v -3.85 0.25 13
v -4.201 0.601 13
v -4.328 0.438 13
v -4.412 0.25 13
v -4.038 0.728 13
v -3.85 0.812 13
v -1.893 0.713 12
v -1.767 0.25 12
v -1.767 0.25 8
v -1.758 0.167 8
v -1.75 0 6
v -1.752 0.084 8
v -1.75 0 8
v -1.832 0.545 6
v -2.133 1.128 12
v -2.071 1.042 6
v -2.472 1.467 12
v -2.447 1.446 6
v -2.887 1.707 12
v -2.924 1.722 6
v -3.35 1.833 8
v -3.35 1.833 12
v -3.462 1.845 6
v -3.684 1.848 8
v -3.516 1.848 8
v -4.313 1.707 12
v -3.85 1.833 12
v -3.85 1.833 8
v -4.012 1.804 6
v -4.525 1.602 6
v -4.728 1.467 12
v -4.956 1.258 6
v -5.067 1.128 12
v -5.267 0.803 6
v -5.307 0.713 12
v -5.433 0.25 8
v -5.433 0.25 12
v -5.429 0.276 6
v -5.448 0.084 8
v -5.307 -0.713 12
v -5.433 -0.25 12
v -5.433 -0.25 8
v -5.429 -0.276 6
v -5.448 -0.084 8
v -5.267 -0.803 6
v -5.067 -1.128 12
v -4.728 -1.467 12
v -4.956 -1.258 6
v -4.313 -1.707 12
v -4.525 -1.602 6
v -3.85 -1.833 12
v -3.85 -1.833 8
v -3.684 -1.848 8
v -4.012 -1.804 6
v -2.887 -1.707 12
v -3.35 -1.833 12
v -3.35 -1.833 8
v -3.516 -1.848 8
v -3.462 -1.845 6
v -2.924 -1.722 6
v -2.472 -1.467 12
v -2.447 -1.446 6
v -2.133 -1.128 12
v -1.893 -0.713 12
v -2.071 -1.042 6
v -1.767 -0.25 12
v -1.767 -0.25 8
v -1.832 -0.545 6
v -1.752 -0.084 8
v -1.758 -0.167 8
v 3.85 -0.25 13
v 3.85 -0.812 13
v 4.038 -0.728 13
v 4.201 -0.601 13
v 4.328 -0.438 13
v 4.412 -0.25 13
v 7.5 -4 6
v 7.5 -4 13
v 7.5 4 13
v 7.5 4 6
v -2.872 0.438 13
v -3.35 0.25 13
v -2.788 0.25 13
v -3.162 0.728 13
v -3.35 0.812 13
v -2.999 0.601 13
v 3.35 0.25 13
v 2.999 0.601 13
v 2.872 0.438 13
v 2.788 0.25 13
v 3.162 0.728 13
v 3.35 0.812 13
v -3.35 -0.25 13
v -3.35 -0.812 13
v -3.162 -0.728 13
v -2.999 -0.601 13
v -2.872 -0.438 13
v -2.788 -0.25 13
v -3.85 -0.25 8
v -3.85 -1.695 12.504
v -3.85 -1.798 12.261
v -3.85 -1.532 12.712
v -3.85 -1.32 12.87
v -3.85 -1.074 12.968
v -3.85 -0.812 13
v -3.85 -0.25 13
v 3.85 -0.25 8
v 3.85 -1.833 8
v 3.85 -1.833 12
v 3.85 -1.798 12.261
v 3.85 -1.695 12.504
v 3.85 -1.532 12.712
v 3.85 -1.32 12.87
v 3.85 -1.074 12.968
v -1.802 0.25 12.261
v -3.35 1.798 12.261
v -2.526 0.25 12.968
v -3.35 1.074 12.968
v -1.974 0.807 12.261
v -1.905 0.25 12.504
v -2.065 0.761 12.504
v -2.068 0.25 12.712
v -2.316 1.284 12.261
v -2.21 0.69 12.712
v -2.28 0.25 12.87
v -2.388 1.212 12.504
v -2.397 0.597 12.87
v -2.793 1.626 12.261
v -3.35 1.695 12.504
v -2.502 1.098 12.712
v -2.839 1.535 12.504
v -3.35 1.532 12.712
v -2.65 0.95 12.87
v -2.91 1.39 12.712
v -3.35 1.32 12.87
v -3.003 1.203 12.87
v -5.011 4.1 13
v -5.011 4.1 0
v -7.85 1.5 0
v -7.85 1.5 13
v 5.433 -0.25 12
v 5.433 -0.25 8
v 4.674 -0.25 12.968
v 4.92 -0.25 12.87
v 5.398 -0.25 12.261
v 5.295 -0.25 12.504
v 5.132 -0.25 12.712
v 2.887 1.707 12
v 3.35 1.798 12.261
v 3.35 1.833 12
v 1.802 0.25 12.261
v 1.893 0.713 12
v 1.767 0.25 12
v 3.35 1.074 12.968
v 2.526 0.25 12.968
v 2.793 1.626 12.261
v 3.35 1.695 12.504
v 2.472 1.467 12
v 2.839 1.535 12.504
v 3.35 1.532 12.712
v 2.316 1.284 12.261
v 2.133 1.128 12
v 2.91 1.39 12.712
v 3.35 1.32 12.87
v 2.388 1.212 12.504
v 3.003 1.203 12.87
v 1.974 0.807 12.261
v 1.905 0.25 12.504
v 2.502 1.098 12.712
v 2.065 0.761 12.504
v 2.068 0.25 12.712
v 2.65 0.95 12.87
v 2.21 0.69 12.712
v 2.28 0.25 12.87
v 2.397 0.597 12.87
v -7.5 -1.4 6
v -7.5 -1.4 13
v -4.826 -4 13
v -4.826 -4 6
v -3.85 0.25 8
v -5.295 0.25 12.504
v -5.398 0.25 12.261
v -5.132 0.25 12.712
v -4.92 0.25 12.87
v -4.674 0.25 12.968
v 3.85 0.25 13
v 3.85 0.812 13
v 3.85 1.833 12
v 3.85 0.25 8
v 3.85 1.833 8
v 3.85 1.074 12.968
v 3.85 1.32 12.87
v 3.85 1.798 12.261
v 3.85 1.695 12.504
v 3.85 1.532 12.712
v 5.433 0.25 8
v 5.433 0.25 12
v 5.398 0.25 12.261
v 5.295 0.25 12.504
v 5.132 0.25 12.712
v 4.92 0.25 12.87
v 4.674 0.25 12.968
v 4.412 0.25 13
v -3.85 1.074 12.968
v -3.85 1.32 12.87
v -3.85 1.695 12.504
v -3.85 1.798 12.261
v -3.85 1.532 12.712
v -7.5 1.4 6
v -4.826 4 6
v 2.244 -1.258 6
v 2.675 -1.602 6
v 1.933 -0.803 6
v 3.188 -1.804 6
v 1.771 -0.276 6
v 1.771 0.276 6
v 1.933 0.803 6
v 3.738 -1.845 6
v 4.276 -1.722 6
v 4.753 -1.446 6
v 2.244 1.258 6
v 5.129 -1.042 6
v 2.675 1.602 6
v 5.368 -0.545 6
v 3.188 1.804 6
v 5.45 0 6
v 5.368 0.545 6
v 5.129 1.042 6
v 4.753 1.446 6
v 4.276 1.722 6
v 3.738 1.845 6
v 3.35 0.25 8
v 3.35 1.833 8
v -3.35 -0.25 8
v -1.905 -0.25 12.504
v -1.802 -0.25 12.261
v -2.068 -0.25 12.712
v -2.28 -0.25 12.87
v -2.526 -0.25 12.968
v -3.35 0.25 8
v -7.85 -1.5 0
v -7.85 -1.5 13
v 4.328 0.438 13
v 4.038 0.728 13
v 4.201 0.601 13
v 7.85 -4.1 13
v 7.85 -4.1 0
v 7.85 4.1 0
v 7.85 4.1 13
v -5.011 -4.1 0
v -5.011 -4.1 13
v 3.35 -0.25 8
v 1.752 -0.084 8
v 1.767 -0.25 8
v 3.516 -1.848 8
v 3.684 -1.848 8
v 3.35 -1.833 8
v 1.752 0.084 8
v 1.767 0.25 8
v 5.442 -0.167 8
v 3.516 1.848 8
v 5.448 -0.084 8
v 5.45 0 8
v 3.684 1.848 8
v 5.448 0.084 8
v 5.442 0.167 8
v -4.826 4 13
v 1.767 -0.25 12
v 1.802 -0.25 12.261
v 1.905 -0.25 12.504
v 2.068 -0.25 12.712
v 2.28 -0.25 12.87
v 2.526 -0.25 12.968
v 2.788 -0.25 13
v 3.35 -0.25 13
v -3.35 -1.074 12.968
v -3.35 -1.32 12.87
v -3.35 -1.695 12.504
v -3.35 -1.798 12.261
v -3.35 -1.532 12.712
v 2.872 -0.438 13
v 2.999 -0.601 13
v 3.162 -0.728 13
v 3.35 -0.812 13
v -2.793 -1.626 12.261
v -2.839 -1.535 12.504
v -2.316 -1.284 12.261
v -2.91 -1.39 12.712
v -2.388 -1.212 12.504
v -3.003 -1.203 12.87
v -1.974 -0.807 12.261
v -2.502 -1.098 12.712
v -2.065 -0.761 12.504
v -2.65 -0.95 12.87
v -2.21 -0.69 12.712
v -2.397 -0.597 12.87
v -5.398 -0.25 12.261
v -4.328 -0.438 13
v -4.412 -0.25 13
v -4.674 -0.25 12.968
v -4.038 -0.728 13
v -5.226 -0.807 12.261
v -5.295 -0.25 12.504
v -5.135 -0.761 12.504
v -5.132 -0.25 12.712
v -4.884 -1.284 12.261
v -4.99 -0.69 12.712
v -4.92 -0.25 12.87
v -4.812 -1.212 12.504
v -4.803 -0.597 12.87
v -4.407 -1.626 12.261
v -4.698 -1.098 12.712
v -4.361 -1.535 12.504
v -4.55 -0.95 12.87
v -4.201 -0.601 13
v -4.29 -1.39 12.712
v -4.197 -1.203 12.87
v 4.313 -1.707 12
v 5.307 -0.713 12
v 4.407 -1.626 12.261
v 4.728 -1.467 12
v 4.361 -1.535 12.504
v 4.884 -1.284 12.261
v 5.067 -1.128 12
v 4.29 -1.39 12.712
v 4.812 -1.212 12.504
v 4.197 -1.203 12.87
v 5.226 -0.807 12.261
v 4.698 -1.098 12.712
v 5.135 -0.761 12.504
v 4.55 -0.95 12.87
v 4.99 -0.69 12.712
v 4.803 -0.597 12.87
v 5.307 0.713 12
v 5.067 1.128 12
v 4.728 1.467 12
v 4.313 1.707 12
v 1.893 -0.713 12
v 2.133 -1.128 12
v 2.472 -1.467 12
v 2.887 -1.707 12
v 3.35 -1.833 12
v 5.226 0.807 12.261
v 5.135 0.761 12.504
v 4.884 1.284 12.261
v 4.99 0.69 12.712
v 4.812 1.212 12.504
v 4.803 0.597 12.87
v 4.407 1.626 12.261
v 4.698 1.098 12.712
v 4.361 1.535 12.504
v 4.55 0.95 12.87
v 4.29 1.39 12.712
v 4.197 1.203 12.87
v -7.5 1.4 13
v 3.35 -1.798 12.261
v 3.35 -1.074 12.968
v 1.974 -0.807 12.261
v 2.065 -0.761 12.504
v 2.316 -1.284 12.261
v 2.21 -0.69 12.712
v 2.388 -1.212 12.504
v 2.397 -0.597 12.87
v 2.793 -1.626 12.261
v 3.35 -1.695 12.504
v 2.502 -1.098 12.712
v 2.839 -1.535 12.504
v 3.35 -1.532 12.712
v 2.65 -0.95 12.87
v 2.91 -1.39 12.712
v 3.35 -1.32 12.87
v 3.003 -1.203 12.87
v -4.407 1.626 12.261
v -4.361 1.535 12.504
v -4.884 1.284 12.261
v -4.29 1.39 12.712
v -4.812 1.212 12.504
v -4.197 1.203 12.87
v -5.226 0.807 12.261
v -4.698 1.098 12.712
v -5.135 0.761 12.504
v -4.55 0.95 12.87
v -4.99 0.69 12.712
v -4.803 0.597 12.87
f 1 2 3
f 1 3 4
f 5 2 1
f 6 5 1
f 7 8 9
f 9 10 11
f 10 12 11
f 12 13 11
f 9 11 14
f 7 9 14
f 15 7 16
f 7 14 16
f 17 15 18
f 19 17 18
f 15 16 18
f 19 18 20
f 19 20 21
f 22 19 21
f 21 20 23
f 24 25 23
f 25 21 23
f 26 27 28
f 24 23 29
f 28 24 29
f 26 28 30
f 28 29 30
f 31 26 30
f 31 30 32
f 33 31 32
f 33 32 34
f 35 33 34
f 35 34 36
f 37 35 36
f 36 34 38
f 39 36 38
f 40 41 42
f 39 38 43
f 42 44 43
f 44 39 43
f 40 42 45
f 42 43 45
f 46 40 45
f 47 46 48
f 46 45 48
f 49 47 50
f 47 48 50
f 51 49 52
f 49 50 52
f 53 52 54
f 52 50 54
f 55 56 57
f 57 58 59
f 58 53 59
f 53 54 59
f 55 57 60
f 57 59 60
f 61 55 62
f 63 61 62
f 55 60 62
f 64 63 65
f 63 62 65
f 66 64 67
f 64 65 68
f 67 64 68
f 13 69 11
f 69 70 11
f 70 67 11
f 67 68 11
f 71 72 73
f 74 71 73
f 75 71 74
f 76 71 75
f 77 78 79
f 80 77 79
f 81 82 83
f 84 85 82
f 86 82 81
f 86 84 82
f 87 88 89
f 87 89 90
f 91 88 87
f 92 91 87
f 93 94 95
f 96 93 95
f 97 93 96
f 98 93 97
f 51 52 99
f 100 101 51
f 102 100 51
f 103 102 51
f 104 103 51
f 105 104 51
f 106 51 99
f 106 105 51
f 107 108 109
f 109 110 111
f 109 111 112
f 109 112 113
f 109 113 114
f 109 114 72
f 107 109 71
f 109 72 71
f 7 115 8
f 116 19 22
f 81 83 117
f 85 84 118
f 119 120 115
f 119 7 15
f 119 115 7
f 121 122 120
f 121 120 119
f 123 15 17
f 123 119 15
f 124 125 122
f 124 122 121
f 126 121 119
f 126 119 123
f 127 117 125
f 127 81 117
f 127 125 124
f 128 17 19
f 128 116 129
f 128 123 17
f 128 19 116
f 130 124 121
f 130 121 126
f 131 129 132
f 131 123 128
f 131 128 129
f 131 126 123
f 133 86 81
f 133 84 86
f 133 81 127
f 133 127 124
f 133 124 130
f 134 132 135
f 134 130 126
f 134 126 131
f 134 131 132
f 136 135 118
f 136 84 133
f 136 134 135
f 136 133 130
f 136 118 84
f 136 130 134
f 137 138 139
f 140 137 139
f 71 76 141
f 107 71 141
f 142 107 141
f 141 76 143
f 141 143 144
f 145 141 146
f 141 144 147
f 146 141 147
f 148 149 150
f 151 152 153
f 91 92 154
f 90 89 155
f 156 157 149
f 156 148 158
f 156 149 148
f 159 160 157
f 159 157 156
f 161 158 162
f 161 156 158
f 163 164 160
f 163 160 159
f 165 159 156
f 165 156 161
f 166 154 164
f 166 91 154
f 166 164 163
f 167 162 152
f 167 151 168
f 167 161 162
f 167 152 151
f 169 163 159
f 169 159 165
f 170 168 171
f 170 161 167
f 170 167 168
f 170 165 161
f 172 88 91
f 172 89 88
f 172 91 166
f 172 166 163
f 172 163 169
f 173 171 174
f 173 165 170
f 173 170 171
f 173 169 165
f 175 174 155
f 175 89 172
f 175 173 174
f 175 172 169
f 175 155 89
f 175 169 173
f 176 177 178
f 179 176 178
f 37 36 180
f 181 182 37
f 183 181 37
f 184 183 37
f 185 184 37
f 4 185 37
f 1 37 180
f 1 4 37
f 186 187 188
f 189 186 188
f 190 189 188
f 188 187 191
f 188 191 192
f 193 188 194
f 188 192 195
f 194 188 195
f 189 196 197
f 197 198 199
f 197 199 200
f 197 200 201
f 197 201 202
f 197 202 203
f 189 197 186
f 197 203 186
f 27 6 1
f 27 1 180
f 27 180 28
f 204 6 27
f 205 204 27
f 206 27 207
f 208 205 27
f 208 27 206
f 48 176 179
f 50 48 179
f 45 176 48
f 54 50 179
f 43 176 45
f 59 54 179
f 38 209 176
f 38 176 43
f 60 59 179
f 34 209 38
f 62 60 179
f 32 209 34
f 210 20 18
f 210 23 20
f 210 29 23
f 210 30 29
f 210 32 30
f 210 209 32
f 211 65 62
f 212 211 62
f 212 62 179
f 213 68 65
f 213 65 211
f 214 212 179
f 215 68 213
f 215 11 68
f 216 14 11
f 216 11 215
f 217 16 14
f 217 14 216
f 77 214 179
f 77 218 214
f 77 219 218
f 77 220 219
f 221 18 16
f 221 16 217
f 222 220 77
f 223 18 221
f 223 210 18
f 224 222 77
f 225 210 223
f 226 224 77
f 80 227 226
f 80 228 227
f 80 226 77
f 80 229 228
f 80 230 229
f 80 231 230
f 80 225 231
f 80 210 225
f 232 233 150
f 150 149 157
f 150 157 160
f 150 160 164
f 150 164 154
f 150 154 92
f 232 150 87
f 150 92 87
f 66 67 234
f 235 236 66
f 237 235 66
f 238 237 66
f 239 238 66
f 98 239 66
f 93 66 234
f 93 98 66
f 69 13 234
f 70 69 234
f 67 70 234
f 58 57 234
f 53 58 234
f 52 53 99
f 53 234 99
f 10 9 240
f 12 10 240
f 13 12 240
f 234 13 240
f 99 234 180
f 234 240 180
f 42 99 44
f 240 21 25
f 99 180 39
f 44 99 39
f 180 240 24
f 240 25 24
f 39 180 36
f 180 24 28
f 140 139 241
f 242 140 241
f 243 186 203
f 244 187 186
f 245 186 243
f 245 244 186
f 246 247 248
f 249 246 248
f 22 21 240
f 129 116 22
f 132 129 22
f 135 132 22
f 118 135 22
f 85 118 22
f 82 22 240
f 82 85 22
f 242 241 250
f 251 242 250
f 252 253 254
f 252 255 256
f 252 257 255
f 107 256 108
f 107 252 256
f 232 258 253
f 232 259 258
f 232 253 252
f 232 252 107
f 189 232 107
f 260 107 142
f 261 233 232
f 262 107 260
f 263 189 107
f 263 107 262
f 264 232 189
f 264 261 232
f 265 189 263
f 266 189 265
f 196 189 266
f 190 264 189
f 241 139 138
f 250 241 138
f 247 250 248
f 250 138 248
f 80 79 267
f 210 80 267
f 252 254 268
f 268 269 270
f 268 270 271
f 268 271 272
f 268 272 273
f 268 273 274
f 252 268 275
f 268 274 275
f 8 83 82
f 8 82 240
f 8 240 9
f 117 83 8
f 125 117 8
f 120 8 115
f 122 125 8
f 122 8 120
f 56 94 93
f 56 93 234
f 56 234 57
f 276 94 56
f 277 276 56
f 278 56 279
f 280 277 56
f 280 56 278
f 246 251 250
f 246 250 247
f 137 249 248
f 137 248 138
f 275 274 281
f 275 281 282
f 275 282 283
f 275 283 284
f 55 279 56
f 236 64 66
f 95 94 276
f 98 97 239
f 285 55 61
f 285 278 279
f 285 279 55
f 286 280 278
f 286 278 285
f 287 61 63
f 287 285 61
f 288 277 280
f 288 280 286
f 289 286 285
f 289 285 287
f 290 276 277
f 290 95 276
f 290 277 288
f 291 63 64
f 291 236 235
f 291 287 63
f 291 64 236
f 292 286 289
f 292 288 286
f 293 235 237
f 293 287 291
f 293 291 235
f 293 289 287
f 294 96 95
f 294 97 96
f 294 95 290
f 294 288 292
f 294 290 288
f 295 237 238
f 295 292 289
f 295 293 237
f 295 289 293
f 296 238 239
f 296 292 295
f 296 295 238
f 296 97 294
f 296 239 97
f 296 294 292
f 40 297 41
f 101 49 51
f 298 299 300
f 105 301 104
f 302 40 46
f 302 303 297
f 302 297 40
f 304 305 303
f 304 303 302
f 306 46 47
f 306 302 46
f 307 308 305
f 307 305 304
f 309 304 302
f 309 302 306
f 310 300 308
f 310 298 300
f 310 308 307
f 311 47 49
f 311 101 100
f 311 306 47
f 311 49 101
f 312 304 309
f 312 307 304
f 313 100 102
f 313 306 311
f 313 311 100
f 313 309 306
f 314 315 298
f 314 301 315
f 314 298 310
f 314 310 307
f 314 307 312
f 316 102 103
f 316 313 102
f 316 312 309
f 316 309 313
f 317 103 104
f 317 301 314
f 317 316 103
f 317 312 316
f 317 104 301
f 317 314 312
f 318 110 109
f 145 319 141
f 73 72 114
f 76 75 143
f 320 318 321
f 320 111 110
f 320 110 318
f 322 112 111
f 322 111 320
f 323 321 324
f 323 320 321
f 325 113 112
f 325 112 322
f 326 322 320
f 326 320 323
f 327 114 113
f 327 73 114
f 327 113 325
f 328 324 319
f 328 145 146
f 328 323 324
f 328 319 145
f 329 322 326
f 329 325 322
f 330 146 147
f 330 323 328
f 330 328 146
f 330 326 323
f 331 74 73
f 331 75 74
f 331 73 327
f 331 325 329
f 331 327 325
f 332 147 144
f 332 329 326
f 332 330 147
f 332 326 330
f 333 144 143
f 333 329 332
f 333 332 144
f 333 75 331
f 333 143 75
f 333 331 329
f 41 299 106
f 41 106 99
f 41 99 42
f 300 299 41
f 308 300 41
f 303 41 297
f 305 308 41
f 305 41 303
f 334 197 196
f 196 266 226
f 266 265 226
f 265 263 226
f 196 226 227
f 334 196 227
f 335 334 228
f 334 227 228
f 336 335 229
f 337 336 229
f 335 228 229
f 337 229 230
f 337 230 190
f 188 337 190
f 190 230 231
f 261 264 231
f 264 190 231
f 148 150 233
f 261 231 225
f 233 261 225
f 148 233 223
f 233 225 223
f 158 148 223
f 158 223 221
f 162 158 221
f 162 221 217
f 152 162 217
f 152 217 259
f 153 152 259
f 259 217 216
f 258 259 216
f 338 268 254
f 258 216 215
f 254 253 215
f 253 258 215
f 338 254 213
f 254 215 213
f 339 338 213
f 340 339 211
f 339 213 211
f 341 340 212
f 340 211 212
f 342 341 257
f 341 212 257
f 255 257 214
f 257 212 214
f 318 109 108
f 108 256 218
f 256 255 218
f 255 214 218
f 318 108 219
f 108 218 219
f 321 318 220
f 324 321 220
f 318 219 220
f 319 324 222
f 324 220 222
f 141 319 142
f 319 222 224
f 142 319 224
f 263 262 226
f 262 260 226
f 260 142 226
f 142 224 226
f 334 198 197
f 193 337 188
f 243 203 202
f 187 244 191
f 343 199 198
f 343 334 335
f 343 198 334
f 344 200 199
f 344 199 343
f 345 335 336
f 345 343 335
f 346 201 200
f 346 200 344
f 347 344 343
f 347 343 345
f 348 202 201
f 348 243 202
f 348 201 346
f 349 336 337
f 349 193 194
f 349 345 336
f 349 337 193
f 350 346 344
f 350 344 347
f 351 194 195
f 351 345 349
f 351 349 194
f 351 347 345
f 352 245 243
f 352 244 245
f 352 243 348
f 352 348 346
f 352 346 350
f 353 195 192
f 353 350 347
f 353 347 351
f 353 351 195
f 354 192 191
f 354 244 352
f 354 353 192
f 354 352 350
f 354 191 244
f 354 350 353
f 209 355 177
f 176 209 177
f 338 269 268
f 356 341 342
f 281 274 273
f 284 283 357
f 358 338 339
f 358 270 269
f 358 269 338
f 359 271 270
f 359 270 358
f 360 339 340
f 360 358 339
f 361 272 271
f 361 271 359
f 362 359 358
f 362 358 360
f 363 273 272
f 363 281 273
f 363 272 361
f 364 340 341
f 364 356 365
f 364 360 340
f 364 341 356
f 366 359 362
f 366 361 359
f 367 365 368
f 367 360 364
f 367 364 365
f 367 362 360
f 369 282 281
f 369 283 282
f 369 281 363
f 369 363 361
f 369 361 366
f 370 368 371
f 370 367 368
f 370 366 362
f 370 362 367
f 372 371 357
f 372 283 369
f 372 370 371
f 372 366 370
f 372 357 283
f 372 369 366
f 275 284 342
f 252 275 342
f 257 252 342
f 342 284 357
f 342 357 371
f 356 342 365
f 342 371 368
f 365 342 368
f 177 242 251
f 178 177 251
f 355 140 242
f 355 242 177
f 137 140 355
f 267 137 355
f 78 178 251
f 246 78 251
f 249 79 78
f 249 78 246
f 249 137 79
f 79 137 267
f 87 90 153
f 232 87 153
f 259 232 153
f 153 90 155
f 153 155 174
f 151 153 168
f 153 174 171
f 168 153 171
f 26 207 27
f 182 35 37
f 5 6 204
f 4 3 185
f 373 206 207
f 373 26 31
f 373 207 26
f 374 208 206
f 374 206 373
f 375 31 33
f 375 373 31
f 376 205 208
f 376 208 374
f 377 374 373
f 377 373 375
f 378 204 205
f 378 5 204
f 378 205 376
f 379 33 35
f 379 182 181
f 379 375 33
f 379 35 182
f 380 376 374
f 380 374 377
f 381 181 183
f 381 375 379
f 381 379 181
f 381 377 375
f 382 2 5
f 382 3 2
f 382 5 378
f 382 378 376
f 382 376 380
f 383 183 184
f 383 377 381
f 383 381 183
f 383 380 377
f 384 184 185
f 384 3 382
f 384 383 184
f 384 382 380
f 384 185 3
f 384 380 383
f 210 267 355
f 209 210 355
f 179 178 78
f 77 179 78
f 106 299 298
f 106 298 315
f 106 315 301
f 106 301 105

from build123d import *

# Parameters (mm, degrees)
PAD_DEPTH       = 13
POCKET_DEPTH    = 10
SKETCH003_R     = 1.85
PAD001_DEPTH    = 7
FILLET_R        = 1
POCKET001_DEPTH = 5


with BuildPart() as part:
    # Sketch → Pad (new body)
    with BuildSketch(Plane.XY):
        Polygon((7.85, 4.1), (-5.010546, 4.1), (-7.85, 1.5), (-7.85, -1.5), (-5.010546, -4.1), (7.85, -4.1), align=None)
    extrude(amount=PAD_DEPTH)

    # Sketch002 → Pocket (cut)
    with BuildSketch(Plane.XY.offset(16)):
        Polygon((7.5, 4), (-4.825509, 4), (-7.5, 1.4), (-7.5, -1.4), (-4.825509, -4), (7.5, -4), align=None)
    extrude(amount=-POCKET_DEPTH, mode=Mode.SUBTRACT)

    # Sketch003 (on Face15 of Pocket) → Pad001 (join)
    with BuildSketch(Plane.XY.offset(6)):
        with Locations((-3.6, 0)):
            Circle(SKETCH003_R)
        with Locations((3.6, 0)):
            Circle(SKETCH003_R)
    extrude(amount=PAD001_DEPTH)

    # Fillet
    fillet_edges = [part.edges().sort_by_distance(p)[0] for p in [
        (-5.45, 0, 13),
        (1.75, 0, 13),
    ]]
    fillet(fillet_edges, radius=FILLET_R)

    # Sketch004 (on Face4 of Fillet) → Pocket001 (cut)
    with BuildSketch(Plane.XY.offset(13)):
        Polygon((-3.85, 2.25), (-3.35, 2.25), (-3.35, 0.25), (-1.35, 0.25), (-1.35, -0.25), (-3.35, -0.25), (-3.35, -2.25), (-3.85, -2.25), (-3.85, -0.25), (-5.85, -0.25), (-5.85, 0.25), (-3.85, 0.25), align=None)
        Polygon((3.85, 2.25), (3.35, 2.25), (3.35, 0.25), (1.35, 0.25), (1.35, -0.25), (3.35, -0.25), (3.35, -2.25), (3.85, -2.25), (3.85, -0.25), (5.85, -0.25), (5.85, 0.25), (3.85, 0.25), align=None)
    extrude(amount=-POCKET001_DEPTH, mode=Mode.SUBTRACT)


solid = part.part
